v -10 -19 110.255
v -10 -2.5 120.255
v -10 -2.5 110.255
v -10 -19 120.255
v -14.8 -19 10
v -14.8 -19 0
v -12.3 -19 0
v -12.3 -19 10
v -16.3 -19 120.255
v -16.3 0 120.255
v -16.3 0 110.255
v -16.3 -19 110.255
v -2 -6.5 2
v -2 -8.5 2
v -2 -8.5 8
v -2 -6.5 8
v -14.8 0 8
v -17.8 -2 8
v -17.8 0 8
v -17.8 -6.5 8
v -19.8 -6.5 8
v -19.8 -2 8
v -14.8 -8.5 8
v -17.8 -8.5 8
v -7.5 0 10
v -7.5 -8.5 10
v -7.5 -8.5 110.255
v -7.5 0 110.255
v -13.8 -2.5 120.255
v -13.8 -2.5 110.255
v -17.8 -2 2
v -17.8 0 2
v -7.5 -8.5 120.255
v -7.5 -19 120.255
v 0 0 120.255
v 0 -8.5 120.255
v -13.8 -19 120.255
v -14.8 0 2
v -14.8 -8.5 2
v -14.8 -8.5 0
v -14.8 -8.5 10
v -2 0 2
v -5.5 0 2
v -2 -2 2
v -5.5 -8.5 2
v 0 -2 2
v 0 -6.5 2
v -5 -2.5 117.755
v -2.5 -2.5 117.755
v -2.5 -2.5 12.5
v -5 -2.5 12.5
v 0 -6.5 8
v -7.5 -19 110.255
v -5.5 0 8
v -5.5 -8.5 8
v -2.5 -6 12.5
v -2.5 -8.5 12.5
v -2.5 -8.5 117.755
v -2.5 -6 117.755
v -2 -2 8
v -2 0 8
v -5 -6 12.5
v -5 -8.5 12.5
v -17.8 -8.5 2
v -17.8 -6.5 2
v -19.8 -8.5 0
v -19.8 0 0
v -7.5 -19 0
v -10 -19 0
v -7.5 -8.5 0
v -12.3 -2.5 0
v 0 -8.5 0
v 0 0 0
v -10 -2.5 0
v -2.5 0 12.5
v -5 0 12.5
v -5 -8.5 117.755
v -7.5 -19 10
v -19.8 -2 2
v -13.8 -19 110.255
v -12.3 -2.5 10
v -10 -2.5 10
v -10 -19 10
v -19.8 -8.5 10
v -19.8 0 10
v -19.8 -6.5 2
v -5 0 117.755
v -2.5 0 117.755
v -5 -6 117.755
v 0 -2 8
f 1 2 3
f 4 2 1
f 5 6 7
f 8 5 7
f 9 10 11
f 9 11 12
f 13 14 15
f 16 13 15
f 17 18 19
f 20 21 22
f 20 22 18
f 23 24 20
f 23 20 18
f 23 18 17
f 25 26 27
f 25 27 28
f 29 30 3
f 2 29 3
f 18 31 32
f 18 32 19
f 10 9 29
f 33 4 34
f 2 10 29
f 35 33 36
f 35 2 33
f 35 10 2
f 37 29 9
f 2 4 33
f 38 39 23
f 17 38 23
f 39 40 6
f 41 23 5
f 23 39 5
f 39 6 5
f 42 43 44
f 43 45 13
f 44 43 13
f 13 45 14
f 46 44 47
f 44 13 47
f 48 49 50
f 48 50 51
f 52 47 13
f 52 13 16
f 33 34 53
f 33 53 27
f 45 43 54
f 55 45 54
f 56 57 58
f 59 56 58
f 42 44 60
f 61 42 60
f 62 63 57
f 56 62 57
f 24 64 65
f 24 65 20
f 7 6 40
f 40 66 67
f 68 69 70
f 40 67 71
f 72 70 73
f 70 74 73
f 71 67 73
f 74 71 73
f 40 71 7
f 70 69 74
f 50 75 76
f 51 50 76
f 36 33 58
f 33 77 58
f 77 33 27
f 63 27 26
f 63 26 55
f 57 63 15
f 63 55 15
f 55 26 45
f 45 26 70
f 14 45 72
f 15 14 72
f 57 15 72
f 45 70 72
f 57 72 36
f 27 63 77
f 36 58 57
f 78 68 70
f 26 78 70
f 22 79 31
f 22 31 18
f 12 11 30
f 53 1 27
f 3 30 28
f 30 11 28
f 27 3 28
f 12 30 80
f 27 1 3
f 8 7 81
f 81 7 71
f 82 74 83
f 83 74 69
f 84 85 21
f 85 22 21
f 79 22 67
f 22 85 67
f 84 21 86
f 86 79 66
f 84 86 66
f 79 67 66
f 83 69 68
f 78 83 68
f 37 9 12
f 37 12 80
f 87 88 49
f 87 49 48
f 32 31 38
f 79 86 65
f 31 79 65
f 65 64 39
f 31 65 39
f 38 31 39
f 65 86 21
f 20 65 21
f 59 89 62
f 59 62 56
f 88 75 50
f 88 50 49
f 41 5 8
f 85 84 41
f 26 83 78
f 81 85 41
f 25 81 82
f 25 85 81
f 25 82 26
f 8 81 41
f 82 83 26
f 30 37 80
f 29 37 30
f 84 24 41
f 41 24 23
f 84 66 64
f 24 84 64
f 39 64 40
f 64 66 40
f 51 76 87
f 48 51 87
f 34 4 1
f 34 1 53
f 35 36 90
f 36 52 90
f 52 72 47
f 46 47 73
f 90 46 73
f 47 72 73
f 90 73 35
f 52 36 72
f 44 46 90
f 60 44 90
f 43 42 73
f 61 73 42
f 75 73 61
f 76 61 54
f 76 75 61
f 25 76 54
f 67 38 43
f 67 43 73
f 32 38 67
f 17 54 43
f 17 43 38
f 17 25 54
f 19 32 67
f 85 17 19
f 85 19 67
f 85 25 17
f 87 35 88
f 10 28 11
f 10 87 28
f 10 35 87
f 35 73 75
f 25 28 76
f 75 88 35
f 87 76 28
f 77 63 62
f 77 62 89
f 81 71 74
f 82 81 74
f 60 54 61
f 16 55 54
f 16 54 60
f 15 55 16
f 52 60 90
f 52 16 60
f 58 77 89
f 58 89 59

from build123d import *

# Parameters (mm, degrees)
F1_DEPTH  = 10
F2_W      = 7.5
F2_H      = 8.5
F3_DEPTH  = 110.255
F5_DEPTH  = 10
F6_W      = 4.5
F6_H      = 6
F7_DEPTH  = 5
F8_W      = 3
F8_H      = 6
F9_DEPTH  = 8.501
F10_W     = 4.5
F10_H     = 6
F11_DEPTH = 5
F12_W     = 3.5
F12_H     = 6
F13_DEPTH = 8.501
F14_W     = 2.5
F14_H     = 105.255
F15_DEPTH = 2.5
F16_W     = 2.5
F16_H     = 105.255
F17_DEPTH = 2.5


with BuildPart() as f1:
    # F0 (on Top) → F1 (new body)
    with BuildSketch(Plane.XY):
        Polygon((0, -8.5), (0, 0), (-19.8, 0), (-19.8, -8.5), (-14.8, -8.5), (-14.8, -19), (-12.3, -19), (-12.3, -2.5), (-10, -2.5), (-10, -19), (-7.5, -19), (-7.5, -8.5), align=None)
    extrude(amount=F1_DEPTH)

    # F2 (on face) → F3 (join)
    with BuildSketch(Plane.XY.offset(10)):
        with Locations((-3.75, -4.25)):
            Rectangle(F2_W, F2_H)
    extrude(amount=F3_DEPTH)

    # F4 (on face) → F5 (join)
    with BuildSketch(Plane.XY.offset(120.255)):
        Polygon((-7.5, -19), (-7.5, 0), (-16.3, 0), (-16.3, -19), (-13.8, -19), (-13.8, -2.5), (-10, -2.5), (-10, -19), align=None)
    extrude(amount=-F5_DEPTH)

    # F6 (on face) → F7 (cut, through all)
    with BuildSketch(Plane(origin=(-19.8, 0, 0), x_dir=(0, -1, 0), z_dir=(-1, 0, 0))):
        with Locations((4.25, 5)):
            Rectangle(F6_W, F6_H)
    extrude(amount=-F7_DEPTH, mode=Mode.SUBTRACT)

    # F8 (on face) → F9 (cut, through all)
    with BuildSketch(Plane.XZ.offset(8.5)):
        with Locations((-16.3, 5)):
            Rectangle(F8_W, F8_H)
    extrude(amount=-F9_DEPTH, mode=Mode.SUBTRACT)

    # F10 (on face) → F11 (cut)
    with BuildSketch(Plane.YZ):
        with Locations((-4.25, 5)):
            Rectangle(F10_W, F10_H)
    extrude(amount=-F11_DEPTH, mode=Mode.SUBTRACT)

    # F12 (on face) → F13 (cut, through all)
    with BuildSketch(Plane.XZ.offset(8.5)):
        with Locations((-3.75, 5)):
            Rectangle(F12_W, F12_H)
    extrude(amount=-F13_DEPTH, mode=Mode.SUBTRACT)

    # F14 (on face) → F15 (cut)
    with BuildSketch(Plane(origin=(0, 0, 0), x_dir=(-1, 0, 0), z_dir=(0, 1, 0))):
        with Locations((3.75, 65.1275)):
            Rectangle(F14_W, F14_H)
    extrude(amount=-F15_DEPTH, mode=Mode.SUBTRACT)

    # F16 (on face) → F17 (cut)
    with BuildSketch(Plane.XZ.offset(8.5)):
        with Locations((-3.75, 65.1275)):
            Rectangle(F16_W, F16_H)
    extrude(amount=-F17_DEPTH, mode=Mode.SUBTRACT)


solid = f1.part
